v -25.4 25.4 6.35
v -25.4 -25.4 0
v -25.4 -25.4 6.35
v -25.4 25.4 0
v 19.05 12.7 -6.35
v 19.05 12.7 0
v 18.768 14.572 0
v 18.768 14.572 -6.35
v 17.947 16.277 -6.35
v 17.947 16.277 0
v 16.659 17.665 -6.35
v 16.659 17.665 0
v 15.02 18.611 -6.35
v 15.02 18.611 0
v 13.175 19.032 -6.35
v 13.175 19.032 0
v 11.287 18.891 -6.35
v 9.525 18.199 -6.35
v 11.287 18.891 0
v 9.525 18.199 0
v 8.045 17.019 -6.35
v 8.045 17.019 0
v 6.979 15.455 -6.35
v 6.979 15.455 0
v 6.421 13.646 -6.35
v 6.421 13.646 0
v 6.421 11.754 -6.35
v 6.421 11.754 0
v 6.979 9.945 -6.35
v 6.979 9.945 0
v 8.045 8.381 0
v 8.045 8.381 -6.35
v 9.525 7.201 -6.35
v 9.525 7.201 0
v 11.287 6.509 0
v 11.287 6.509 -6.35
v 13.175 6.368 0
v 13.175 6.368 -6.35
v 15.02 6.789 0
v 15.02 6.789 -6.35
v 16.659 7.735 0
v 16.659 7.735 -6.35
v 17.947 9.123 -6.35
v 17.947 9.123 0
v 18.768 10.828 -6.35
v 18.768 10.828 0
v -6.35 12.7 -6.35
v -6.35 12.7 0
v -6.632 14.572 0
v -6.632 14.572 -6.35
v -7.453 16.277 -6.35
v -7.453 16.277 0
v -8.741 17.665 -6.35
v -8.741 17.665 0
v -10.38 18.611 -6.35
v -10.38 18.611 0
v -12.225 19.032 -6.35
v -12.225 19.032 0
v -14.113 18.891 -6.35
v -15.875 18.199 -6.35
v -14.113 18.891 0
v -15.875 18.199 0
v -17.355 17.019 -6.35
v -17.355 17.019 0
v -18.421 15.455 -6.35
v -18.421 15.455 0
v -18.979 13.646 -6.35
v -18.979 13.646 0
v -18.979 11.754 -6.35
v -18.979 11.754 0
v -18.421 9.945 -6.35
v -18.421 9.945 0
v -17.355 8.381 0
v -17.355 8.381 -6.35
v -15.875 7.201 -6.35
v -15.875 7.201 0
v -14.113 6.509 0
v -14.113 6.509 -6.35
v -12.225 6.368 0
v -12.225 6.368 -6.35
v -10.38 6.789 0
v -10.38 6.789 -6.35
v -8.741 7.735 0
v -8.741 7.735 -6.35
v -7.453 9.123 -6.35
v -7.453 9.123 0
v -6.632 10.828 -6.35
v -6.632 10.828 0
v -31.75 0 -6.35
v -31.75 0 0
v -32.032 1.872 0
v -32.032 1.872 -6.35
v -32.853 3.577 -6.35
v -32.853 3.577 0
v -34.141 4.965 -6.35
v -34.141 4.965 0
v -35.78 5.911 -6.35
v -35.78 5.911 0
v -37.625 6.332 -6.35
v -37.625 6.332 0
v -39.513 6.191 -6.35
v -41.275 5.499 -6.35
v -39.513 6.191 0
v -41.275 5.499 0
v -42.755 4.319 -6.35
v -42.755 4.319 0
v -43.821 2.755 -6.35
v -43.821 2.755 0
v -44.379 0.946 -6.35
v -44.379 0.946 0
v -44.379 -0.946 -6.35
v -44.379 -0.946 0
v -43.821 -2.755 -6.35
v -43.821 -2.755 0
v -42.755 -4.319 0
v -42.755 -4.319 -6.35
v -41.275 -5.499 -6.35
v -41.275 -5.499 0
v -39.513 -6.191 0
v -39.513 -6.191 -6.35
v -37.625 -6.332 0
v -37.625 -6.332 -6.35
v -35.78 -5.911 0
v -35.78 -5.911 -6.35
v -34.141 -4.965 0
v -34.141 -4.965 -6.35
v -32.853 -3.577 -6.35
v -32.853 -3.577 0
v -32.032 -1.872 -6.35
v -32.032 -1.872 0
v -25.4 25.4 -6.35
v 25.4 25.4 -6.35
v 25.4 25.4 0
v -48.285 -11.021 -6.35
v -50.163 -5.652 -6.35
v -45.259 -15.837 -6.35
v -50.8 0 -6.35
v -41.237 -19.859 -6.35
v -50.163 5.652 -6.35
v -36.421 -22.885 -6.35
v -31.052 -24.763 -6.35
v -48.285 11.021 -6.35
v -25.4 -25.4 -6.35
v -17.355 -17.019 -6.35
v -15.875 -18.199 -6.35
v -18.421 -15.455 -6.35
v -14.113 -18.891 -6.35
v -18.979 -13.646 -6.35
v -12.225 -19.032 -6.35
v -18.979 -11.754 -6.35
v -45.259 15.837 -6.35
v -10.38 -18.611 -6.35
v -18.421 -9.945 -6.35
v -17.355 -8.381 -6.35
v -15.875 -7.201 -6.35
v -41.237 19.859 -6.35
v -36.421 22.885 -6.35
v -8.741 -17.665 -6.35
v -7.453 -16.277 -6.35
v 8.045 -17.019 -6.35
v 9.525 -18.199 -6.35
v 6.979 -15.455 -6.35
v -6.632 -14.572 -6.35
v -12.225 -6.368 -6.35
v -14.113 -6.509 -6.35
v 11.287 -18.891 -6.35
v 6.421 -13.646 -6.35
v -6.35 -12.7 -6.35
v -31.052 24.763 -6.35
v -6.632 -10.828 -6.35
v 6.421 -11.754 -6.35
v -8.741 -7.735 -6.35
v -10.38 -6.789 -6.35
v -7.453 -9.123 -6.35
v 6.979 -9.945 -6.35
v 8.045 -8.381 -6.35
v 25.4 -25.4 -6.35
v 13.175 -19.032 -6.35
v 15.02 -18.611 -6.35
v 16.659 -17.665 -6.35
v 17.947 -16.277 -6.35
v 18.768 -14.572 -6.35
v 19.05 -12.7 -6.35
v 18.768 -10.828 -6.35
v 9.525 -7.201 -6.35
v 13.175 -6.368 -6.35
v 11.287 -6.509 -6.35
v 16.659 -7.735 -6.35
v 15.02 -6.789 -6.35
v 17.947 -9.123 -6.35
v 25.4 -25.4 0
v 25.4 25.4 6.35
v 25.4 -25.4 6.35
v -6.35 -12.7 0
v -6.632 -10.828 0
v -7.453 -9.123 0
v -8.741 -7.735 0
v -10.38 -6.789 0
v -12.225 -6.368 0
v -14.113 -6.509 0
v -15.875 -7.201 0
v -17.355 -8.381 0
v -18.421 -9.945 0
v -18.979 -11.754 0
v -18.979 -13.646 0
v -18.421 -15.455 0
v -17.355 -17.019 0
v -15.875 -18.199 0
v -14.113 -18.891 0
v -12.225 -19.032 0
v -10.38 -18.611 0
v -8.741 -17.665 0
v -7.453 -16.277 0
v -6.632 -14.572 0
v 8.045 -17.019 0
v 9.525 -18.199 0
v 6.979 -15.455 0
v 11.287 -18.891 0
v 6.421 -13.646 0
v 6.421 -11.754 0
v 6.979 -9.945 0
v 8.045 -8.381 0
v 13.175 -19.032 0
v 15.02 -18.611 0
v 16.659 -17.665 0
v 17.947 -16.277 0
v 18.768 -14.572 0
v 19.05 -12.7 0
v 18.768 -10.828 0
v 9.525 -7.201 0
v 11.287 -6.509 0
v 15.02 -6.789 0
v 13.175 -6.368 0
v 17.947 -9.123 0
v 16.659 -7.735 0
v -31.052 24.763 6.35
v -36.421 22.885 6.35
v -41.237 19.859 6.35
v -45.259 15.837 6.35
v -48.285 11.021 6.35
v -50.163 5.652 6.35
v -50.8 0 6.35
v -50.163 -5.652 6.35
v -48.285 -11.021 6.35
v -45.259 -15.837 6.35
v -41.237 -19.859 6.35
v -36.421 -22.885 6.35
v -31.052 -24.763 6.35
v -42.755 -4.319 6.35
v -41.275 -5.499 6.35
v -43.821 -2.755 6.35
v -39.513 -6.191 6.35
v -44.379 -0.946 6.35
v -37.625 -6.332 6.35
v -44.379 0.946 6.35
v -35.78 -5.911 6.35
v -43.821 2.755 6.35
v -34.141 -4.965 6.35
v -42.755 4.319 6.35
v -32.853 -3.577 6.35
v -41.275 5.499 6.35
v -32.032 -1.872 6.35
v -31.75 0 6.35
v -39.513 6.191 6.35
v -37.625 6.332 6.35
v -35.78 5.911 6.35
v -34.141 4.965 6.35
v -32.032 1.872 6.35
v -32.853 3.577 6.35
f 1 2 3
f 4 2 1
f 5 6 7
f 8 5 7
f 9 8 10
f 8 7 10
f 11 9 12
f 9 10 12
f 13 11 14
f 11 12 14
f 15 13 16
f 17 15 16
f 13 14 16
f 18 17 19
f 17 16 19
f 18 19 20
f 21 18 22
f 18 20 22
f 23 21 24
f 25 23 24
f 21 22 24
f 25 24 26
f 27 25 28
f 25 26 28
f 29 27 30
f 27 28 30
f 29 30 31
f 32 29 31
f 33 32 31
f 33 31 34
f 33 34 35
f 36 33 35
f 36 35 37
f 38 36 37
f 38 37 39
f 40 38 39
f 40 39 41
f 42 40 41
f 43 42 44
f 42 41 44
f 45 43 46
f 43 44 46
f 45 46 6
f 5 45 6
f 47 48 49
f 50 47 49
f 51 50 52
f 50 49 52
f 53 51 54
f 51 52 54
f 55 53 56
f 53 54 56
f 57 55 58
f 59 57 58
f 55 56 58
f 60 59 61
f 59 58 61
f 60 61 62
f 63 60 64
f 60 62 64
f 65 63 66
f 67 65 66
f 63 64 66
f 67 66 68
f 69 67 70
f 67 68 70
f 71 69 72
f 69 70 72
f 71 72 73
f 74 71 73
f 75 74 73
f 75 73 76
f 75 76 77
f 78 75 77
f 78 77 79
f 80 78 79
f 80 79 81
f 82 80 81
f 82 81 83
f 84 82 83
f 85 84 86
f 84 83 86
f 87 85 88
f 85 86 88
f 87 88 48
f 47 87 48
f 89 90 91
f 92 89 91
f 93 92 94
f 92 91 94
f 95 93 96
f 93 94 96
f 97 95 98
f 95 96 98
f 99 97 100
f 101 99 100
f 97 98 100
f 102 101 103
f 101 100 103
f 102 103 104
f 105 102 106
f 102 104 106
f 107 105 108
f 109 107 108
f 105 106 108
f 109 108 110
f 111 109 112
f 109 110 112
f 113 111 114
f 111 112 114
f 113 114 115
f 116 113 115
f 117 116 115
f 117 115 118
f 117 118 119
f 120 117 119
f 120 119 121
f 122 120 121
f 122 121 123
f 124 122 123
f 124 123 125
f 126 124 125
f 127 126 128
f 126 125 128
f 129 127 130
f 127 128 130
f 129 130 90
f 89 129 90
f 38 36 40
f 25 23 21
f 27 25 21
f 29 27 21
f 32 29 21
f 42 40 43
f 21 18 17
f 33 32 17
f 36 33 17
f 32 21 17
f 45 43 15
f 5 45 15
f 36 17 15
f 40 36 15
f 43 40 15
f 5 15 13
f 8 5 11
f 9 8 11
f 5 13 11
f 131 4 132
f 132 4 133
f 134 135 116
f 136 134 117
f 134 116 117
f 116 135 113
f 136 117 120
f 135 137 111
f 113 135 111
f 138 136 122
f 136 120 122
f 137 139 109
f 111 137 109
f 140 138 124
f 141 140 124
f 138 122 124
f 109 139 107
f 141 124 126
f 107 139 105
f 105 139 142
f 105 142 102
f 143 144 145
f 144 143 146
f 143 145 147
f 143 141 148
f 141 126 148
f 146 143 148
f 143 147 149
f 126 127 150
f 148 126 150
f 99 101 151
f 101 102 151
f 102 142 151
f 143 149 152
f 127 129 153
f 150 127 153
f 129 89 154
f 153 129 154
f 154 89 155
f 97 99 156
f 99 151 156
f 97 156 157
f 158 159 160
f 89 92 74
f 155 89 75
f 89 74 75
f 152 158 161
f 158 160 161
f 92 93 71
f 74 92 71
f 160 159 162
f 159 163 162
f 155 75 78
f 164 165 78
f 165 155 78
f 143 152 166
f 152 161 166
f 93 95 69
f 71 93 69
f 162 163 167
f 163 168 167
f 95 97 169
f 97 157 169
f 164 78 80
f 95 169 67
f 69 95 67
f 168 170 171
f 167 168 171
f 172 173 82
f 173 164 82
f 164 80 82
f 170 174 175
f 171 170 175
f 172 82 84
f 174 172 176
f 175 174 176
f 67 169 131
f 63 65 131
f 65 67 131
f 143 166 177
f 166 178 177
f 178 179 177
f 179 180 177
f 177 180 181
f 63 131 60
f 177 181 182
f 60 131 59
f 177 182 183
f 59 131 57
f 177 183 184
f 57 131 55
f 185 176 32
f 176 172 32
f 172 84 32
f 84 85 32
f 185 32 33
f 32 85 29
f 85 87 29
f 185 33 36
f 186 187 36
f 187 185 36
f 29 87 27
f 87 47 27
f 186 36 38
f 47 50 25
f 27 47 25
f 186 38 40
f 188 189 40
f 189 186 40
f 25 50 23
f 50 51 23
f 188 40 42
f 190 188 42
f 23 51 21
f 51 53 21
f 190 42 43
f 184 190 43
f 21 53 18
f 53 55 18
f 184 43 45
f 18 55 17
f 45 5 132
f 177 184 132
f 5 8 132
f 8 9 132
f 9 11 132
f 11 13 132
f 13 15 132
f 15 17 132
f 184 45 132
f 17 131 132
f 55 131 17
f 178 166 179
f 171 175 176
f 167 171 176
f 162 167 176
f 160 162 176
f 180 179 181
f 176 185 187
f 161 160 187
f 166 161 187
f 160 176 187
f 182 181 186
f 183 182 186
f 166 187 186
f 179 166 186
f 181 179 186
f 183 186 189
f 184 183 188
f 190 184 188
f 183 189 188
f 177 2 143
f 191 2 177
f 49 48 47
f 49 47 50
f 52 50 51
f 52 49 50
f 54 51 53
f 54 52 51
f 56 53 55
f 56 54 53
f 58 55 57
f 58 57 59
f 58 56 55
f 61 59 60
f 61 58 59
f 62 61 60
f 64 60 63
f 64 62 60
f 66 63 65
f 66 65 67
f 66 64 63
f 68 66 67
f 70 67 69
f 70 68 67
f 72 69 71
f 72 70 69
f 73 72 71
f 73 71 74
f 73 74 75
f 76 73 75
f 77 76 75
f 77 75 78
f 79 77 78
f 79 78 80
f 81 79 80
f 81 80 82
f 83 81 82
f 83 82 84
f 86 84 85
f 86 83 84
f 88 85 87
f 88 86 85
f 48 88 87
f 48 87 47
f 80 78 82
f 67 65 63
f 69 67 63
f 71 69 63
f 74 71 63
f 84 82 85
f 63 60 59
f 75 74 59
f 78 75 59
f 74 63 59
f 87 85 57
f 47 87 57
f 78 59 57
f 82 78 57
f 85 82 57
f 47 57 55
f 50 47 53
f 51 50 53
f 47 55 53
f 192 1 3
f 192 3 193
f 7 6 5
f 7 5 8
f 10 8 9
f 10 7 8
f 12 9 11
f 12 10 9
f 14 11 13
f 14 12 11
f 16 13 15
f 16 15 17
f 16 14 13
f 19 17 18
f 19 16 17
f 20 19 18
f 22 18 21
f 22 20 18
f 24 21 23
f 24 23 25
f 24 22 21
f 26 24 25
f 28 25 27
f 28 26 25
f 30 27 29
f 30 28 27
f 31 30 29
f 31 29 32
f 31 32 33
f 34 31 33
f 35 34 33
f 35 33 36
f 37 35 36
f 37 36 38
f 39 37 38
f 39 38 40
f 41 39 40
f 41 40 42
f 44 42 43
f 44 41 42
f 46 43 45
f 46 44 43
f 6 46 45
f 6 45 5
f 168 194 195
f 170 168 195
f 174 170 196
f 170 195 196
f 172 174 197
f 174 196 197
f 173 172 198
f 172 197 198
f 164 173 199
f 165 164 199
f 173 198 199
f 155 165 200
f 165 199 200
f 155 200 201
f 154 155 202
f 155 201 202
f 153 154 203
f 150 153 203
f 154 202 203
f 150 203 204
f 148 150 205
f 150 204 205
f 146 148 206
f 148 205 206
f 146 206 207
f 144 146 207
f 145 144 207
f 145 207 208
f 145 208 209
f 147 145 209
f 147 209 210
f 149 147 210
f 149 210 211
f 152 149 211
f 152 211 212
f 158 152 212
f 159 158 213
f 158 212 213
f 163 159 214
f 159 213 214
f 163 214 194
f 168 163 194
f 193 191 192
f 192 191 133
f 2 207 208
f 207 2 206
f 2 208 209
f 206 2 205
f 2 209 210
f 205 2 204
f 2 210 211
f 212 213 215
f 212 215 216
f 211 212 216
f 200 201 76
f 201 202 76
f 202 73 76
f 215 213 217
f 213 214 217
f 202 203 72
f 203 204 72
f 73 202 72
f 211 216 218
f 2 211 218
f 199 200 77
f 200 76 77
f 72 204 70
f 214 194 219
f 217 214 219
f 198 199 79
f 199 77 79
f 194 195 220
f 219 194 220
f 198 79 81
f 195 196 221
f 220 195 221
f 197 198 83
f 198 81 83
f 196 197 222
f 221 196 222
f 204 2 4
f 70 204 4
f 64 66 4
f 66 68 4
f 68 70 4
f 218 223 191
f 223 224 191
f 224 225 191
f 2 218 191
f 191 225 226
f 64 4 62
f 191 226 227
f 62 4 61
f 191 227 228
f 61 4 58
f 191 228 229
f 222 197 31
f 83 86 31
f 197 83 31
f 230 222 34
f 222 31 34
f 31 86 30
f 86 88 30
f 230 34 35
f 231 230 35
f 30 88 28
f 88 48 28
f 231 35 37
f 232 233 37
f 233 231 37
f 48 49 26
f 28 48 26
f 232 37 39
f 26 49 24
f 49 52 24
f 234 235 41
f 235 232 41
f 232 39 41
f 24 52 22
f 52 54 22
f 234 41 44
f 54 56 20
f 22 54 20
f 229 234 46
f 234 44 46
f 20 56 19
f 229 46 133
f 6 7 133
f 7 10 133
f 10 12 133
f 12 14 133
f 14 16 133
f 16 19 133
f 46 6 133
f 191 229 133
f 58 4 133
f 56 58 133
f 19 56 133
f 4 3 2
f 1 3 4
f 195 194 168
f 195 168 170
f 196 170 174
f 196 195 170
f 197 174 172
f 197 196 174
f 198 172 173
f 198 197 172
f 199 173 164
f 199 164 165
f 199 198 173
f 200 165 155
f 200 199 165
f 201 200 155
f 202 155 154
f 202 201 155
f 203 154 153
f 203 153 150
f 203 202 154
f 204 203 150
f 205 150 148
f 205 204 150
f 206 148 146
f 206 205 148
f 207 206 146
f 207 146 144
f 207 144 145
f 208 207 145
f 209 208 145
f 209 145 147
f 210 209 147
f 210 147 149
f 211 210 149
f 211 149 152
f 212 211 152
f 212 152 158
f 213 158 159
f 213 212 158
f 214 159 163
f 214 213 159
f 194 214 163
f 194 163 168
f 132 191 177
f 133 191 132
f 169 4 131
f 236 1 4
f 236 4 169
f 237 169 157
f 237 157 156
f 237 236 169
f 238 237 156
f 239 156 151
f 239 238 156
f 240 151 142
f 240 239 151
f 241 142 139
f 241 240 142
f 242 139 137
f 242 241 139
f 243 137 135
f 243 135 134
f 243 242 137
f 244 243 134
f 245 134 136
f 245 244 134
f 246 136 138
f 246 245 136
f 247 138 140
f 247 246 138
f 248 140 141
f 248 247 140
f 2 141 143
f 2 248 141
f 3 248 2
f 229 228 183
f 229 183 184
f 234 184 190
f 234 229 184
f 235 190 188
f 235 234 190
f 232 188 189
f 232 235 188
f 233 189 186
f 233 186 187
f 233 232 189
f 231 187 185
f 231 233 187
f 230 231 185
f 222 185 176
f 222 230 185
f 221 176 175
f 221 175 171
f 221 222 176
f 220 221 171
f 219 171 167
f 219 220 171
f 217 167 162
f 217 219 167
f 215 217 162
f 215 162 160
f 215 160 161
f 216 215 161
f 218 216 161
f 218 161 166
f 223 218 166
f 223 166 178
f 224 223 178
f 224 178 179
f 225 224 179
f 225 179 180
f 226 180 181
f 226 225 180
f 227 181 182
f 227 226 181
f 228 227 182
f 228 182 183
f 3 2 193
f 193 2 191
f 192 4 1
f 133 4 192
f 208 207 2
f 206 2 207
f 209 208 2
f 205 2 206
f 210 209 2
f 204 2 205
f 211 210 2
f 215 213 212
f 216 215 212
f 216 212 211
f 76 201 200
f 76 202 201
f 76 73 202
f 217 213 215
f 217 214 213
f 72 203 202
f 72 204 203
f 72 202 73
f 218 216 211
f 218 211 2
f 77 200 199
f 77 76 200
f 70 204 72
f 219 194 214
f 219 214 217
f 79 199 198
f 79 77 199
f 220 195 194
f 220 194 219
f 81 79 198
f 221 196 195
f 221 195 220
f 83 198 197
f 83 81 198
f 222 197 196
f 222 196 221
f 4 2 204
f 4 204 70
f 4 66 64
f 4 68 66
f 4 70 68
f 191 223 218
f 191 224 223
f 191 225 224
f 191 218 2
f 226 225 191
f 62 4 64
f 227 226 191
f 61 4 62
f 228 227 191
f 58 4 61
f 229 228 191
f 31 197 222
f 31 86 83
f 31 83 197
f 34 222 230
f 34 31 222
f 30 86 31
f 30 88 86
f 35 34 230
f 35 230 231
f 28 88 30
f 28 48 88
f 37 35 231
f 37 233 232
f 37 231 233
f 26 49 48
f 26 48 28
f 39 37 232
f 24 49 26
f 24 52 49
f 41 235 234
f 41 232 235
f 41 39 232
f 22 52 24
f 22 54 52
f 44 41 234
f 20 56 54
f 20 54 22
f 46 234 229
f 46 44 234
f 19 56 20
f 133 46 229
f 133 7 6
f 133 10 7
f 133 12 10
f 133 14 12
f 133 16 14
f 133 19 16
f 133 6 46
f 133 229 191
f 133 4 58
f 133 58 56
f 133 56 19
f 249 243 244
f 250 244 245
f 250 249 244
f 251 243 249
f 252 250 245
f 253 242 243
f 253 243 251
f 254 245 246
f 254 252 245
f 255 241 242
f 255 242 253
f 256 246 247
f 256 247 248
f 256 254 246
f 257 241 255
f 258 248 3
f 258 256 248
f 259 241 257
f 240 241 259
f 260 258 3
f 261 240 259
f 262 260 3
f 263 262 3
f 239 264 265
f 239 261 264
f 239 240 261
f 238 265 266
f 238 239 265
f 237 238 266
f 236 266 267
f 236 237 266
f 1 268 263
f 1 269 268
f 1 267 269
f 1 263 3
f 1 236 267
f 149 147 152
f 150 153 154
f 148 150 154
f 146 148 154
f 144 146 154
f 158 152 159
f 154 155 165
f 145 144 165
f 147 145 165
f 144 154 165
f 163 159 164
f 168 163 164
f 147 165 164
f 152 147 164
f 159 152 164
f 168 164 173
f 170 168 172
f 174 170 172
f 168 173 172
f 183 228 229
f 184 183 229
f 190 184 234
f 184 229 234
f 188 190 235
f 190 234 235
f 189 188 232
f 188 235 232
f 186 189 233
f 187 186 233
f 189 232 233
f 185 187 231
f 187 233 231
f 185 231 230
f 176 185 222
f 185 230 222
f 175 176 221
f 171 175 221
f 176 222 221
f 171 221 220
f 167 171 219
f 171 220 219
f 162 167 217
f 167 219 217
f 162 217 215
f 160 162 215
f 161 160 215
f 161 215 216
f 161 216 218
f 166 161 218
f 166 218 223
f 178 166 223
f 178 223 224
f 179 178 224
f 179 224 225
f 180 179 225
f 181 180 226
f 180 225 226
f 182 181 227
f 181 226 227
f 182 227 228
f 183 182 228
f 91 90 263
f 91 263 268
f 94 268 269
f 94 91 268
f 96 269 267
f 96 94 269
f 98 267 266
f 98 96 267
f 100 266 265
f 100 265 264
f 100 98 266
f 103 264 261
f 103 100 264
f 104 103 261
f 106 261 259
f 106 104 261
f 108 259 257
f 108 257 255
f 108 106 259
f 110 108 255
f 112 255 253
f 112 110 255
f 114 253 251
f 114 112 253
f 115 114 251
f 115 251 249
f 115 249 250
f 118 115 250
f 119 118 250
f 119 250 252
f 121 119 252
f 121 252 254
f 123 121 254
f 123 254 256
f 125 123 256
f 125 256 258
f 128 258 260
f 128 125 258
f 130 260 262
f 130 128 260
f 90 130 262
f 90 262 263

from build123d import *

# Parameters (mm, degrees)
F0_R          = 6.35
F1_DEPTH      = 6.35
F1_DEPTH_BACK = 6.35
F0_W          = 50.8
F0_H          = 50.8
F2_DEPTH      = 6.35
F3_DEPTH      = 6.35
F4_DEPTH      = 6.35


with BuildPart() as f1:
    # F0 (on Top) → F1 (new body, two sides)
    with BuildSketch(Plane.XY) as f1_sk:
        with BuildLine():
            Line((-25.4, -25.4), (-25.4, 25.4))
            ThreePointArc((-25.4, 25.4), (-50.8, 0), (-25.4, -25.4))
        make_face()
        with Locations((-38.1, 0)):
            Circle(F0_R, mode=Mode.SUBTRACT)
    extrude(amount=F1_DEPTH)
    extrude(f1_sk.sketch, amount=-F1_DEPTH_BACK)

    # F0 (on Top) → F2 (join)
    with BuildSketch(Plane.XY):
        Rectangle(F0_W, F0_H)
        with Locations((-12.7, -12.7)):
            Circle(F0_R, mode=Mode.SUBTRACT)
        with Locations((12.7, -12.7)):
            Circle(F0_R, mode=Mode.SUBTRACT)
        with Locations((-12.7, 12.7)):
            Circle(F0_R, mode=Mode.SUBTRACT)
        with Locations((12.7, 12.7)):
            Circle(F0_R, mode=Mode.SUBTRACT)
    extrude(amount=-F2_DEPTH)


with BuildPart() as f3:
    # F0 (on Top) → F3 (new body)
    with BuildSketch(Plane.XY):
        Rectangle(F0_W, F0_H)
        with Locations((-12.7, -12.7)):
            Circle(F0_R, mode=Mode.SUBTRACT)
        with Locations((12.7, -12.7)):
            Circle(F0_R, mode=Mode.SUBTRACT)
        with Locations((-12.7, 12.7)):
            Circle(F0_R, mode=Mode.SUBTRACT)
        with Locations((12.7, 12.7)):
            Circle(F0_R, mode=Mode.SUBTRACT)
        with Locations((-12.7, -12.7)):
            Circle(F0_R)
        with Locations((12.7, -12.7)):
            Circle(F0_R)
        with Locations((12.7, 12.7)):
            Circle(F0_R)
        with Locations((-12.7, 12.7)):
            Circle(F0_R)
    extrude(amount=F3_DEPTH)

    # F0 (on Top) → F4 (join)
    with BuildSketch(Plane.XY):
        with Locations((12.7, -12.7)):
            Circle(F0_R)
        with Locations((12.7, 12.7)):
            Circle(F0_R)
        with Locations((-12.7, 12.7)):
            Circle(F0_R)
        with Locations((-12.7, -12.7)):
            Circle(F0_R)
    extrude(amount=-F4_DEPTH)


solid = Compound([f1.part, f3.part])
